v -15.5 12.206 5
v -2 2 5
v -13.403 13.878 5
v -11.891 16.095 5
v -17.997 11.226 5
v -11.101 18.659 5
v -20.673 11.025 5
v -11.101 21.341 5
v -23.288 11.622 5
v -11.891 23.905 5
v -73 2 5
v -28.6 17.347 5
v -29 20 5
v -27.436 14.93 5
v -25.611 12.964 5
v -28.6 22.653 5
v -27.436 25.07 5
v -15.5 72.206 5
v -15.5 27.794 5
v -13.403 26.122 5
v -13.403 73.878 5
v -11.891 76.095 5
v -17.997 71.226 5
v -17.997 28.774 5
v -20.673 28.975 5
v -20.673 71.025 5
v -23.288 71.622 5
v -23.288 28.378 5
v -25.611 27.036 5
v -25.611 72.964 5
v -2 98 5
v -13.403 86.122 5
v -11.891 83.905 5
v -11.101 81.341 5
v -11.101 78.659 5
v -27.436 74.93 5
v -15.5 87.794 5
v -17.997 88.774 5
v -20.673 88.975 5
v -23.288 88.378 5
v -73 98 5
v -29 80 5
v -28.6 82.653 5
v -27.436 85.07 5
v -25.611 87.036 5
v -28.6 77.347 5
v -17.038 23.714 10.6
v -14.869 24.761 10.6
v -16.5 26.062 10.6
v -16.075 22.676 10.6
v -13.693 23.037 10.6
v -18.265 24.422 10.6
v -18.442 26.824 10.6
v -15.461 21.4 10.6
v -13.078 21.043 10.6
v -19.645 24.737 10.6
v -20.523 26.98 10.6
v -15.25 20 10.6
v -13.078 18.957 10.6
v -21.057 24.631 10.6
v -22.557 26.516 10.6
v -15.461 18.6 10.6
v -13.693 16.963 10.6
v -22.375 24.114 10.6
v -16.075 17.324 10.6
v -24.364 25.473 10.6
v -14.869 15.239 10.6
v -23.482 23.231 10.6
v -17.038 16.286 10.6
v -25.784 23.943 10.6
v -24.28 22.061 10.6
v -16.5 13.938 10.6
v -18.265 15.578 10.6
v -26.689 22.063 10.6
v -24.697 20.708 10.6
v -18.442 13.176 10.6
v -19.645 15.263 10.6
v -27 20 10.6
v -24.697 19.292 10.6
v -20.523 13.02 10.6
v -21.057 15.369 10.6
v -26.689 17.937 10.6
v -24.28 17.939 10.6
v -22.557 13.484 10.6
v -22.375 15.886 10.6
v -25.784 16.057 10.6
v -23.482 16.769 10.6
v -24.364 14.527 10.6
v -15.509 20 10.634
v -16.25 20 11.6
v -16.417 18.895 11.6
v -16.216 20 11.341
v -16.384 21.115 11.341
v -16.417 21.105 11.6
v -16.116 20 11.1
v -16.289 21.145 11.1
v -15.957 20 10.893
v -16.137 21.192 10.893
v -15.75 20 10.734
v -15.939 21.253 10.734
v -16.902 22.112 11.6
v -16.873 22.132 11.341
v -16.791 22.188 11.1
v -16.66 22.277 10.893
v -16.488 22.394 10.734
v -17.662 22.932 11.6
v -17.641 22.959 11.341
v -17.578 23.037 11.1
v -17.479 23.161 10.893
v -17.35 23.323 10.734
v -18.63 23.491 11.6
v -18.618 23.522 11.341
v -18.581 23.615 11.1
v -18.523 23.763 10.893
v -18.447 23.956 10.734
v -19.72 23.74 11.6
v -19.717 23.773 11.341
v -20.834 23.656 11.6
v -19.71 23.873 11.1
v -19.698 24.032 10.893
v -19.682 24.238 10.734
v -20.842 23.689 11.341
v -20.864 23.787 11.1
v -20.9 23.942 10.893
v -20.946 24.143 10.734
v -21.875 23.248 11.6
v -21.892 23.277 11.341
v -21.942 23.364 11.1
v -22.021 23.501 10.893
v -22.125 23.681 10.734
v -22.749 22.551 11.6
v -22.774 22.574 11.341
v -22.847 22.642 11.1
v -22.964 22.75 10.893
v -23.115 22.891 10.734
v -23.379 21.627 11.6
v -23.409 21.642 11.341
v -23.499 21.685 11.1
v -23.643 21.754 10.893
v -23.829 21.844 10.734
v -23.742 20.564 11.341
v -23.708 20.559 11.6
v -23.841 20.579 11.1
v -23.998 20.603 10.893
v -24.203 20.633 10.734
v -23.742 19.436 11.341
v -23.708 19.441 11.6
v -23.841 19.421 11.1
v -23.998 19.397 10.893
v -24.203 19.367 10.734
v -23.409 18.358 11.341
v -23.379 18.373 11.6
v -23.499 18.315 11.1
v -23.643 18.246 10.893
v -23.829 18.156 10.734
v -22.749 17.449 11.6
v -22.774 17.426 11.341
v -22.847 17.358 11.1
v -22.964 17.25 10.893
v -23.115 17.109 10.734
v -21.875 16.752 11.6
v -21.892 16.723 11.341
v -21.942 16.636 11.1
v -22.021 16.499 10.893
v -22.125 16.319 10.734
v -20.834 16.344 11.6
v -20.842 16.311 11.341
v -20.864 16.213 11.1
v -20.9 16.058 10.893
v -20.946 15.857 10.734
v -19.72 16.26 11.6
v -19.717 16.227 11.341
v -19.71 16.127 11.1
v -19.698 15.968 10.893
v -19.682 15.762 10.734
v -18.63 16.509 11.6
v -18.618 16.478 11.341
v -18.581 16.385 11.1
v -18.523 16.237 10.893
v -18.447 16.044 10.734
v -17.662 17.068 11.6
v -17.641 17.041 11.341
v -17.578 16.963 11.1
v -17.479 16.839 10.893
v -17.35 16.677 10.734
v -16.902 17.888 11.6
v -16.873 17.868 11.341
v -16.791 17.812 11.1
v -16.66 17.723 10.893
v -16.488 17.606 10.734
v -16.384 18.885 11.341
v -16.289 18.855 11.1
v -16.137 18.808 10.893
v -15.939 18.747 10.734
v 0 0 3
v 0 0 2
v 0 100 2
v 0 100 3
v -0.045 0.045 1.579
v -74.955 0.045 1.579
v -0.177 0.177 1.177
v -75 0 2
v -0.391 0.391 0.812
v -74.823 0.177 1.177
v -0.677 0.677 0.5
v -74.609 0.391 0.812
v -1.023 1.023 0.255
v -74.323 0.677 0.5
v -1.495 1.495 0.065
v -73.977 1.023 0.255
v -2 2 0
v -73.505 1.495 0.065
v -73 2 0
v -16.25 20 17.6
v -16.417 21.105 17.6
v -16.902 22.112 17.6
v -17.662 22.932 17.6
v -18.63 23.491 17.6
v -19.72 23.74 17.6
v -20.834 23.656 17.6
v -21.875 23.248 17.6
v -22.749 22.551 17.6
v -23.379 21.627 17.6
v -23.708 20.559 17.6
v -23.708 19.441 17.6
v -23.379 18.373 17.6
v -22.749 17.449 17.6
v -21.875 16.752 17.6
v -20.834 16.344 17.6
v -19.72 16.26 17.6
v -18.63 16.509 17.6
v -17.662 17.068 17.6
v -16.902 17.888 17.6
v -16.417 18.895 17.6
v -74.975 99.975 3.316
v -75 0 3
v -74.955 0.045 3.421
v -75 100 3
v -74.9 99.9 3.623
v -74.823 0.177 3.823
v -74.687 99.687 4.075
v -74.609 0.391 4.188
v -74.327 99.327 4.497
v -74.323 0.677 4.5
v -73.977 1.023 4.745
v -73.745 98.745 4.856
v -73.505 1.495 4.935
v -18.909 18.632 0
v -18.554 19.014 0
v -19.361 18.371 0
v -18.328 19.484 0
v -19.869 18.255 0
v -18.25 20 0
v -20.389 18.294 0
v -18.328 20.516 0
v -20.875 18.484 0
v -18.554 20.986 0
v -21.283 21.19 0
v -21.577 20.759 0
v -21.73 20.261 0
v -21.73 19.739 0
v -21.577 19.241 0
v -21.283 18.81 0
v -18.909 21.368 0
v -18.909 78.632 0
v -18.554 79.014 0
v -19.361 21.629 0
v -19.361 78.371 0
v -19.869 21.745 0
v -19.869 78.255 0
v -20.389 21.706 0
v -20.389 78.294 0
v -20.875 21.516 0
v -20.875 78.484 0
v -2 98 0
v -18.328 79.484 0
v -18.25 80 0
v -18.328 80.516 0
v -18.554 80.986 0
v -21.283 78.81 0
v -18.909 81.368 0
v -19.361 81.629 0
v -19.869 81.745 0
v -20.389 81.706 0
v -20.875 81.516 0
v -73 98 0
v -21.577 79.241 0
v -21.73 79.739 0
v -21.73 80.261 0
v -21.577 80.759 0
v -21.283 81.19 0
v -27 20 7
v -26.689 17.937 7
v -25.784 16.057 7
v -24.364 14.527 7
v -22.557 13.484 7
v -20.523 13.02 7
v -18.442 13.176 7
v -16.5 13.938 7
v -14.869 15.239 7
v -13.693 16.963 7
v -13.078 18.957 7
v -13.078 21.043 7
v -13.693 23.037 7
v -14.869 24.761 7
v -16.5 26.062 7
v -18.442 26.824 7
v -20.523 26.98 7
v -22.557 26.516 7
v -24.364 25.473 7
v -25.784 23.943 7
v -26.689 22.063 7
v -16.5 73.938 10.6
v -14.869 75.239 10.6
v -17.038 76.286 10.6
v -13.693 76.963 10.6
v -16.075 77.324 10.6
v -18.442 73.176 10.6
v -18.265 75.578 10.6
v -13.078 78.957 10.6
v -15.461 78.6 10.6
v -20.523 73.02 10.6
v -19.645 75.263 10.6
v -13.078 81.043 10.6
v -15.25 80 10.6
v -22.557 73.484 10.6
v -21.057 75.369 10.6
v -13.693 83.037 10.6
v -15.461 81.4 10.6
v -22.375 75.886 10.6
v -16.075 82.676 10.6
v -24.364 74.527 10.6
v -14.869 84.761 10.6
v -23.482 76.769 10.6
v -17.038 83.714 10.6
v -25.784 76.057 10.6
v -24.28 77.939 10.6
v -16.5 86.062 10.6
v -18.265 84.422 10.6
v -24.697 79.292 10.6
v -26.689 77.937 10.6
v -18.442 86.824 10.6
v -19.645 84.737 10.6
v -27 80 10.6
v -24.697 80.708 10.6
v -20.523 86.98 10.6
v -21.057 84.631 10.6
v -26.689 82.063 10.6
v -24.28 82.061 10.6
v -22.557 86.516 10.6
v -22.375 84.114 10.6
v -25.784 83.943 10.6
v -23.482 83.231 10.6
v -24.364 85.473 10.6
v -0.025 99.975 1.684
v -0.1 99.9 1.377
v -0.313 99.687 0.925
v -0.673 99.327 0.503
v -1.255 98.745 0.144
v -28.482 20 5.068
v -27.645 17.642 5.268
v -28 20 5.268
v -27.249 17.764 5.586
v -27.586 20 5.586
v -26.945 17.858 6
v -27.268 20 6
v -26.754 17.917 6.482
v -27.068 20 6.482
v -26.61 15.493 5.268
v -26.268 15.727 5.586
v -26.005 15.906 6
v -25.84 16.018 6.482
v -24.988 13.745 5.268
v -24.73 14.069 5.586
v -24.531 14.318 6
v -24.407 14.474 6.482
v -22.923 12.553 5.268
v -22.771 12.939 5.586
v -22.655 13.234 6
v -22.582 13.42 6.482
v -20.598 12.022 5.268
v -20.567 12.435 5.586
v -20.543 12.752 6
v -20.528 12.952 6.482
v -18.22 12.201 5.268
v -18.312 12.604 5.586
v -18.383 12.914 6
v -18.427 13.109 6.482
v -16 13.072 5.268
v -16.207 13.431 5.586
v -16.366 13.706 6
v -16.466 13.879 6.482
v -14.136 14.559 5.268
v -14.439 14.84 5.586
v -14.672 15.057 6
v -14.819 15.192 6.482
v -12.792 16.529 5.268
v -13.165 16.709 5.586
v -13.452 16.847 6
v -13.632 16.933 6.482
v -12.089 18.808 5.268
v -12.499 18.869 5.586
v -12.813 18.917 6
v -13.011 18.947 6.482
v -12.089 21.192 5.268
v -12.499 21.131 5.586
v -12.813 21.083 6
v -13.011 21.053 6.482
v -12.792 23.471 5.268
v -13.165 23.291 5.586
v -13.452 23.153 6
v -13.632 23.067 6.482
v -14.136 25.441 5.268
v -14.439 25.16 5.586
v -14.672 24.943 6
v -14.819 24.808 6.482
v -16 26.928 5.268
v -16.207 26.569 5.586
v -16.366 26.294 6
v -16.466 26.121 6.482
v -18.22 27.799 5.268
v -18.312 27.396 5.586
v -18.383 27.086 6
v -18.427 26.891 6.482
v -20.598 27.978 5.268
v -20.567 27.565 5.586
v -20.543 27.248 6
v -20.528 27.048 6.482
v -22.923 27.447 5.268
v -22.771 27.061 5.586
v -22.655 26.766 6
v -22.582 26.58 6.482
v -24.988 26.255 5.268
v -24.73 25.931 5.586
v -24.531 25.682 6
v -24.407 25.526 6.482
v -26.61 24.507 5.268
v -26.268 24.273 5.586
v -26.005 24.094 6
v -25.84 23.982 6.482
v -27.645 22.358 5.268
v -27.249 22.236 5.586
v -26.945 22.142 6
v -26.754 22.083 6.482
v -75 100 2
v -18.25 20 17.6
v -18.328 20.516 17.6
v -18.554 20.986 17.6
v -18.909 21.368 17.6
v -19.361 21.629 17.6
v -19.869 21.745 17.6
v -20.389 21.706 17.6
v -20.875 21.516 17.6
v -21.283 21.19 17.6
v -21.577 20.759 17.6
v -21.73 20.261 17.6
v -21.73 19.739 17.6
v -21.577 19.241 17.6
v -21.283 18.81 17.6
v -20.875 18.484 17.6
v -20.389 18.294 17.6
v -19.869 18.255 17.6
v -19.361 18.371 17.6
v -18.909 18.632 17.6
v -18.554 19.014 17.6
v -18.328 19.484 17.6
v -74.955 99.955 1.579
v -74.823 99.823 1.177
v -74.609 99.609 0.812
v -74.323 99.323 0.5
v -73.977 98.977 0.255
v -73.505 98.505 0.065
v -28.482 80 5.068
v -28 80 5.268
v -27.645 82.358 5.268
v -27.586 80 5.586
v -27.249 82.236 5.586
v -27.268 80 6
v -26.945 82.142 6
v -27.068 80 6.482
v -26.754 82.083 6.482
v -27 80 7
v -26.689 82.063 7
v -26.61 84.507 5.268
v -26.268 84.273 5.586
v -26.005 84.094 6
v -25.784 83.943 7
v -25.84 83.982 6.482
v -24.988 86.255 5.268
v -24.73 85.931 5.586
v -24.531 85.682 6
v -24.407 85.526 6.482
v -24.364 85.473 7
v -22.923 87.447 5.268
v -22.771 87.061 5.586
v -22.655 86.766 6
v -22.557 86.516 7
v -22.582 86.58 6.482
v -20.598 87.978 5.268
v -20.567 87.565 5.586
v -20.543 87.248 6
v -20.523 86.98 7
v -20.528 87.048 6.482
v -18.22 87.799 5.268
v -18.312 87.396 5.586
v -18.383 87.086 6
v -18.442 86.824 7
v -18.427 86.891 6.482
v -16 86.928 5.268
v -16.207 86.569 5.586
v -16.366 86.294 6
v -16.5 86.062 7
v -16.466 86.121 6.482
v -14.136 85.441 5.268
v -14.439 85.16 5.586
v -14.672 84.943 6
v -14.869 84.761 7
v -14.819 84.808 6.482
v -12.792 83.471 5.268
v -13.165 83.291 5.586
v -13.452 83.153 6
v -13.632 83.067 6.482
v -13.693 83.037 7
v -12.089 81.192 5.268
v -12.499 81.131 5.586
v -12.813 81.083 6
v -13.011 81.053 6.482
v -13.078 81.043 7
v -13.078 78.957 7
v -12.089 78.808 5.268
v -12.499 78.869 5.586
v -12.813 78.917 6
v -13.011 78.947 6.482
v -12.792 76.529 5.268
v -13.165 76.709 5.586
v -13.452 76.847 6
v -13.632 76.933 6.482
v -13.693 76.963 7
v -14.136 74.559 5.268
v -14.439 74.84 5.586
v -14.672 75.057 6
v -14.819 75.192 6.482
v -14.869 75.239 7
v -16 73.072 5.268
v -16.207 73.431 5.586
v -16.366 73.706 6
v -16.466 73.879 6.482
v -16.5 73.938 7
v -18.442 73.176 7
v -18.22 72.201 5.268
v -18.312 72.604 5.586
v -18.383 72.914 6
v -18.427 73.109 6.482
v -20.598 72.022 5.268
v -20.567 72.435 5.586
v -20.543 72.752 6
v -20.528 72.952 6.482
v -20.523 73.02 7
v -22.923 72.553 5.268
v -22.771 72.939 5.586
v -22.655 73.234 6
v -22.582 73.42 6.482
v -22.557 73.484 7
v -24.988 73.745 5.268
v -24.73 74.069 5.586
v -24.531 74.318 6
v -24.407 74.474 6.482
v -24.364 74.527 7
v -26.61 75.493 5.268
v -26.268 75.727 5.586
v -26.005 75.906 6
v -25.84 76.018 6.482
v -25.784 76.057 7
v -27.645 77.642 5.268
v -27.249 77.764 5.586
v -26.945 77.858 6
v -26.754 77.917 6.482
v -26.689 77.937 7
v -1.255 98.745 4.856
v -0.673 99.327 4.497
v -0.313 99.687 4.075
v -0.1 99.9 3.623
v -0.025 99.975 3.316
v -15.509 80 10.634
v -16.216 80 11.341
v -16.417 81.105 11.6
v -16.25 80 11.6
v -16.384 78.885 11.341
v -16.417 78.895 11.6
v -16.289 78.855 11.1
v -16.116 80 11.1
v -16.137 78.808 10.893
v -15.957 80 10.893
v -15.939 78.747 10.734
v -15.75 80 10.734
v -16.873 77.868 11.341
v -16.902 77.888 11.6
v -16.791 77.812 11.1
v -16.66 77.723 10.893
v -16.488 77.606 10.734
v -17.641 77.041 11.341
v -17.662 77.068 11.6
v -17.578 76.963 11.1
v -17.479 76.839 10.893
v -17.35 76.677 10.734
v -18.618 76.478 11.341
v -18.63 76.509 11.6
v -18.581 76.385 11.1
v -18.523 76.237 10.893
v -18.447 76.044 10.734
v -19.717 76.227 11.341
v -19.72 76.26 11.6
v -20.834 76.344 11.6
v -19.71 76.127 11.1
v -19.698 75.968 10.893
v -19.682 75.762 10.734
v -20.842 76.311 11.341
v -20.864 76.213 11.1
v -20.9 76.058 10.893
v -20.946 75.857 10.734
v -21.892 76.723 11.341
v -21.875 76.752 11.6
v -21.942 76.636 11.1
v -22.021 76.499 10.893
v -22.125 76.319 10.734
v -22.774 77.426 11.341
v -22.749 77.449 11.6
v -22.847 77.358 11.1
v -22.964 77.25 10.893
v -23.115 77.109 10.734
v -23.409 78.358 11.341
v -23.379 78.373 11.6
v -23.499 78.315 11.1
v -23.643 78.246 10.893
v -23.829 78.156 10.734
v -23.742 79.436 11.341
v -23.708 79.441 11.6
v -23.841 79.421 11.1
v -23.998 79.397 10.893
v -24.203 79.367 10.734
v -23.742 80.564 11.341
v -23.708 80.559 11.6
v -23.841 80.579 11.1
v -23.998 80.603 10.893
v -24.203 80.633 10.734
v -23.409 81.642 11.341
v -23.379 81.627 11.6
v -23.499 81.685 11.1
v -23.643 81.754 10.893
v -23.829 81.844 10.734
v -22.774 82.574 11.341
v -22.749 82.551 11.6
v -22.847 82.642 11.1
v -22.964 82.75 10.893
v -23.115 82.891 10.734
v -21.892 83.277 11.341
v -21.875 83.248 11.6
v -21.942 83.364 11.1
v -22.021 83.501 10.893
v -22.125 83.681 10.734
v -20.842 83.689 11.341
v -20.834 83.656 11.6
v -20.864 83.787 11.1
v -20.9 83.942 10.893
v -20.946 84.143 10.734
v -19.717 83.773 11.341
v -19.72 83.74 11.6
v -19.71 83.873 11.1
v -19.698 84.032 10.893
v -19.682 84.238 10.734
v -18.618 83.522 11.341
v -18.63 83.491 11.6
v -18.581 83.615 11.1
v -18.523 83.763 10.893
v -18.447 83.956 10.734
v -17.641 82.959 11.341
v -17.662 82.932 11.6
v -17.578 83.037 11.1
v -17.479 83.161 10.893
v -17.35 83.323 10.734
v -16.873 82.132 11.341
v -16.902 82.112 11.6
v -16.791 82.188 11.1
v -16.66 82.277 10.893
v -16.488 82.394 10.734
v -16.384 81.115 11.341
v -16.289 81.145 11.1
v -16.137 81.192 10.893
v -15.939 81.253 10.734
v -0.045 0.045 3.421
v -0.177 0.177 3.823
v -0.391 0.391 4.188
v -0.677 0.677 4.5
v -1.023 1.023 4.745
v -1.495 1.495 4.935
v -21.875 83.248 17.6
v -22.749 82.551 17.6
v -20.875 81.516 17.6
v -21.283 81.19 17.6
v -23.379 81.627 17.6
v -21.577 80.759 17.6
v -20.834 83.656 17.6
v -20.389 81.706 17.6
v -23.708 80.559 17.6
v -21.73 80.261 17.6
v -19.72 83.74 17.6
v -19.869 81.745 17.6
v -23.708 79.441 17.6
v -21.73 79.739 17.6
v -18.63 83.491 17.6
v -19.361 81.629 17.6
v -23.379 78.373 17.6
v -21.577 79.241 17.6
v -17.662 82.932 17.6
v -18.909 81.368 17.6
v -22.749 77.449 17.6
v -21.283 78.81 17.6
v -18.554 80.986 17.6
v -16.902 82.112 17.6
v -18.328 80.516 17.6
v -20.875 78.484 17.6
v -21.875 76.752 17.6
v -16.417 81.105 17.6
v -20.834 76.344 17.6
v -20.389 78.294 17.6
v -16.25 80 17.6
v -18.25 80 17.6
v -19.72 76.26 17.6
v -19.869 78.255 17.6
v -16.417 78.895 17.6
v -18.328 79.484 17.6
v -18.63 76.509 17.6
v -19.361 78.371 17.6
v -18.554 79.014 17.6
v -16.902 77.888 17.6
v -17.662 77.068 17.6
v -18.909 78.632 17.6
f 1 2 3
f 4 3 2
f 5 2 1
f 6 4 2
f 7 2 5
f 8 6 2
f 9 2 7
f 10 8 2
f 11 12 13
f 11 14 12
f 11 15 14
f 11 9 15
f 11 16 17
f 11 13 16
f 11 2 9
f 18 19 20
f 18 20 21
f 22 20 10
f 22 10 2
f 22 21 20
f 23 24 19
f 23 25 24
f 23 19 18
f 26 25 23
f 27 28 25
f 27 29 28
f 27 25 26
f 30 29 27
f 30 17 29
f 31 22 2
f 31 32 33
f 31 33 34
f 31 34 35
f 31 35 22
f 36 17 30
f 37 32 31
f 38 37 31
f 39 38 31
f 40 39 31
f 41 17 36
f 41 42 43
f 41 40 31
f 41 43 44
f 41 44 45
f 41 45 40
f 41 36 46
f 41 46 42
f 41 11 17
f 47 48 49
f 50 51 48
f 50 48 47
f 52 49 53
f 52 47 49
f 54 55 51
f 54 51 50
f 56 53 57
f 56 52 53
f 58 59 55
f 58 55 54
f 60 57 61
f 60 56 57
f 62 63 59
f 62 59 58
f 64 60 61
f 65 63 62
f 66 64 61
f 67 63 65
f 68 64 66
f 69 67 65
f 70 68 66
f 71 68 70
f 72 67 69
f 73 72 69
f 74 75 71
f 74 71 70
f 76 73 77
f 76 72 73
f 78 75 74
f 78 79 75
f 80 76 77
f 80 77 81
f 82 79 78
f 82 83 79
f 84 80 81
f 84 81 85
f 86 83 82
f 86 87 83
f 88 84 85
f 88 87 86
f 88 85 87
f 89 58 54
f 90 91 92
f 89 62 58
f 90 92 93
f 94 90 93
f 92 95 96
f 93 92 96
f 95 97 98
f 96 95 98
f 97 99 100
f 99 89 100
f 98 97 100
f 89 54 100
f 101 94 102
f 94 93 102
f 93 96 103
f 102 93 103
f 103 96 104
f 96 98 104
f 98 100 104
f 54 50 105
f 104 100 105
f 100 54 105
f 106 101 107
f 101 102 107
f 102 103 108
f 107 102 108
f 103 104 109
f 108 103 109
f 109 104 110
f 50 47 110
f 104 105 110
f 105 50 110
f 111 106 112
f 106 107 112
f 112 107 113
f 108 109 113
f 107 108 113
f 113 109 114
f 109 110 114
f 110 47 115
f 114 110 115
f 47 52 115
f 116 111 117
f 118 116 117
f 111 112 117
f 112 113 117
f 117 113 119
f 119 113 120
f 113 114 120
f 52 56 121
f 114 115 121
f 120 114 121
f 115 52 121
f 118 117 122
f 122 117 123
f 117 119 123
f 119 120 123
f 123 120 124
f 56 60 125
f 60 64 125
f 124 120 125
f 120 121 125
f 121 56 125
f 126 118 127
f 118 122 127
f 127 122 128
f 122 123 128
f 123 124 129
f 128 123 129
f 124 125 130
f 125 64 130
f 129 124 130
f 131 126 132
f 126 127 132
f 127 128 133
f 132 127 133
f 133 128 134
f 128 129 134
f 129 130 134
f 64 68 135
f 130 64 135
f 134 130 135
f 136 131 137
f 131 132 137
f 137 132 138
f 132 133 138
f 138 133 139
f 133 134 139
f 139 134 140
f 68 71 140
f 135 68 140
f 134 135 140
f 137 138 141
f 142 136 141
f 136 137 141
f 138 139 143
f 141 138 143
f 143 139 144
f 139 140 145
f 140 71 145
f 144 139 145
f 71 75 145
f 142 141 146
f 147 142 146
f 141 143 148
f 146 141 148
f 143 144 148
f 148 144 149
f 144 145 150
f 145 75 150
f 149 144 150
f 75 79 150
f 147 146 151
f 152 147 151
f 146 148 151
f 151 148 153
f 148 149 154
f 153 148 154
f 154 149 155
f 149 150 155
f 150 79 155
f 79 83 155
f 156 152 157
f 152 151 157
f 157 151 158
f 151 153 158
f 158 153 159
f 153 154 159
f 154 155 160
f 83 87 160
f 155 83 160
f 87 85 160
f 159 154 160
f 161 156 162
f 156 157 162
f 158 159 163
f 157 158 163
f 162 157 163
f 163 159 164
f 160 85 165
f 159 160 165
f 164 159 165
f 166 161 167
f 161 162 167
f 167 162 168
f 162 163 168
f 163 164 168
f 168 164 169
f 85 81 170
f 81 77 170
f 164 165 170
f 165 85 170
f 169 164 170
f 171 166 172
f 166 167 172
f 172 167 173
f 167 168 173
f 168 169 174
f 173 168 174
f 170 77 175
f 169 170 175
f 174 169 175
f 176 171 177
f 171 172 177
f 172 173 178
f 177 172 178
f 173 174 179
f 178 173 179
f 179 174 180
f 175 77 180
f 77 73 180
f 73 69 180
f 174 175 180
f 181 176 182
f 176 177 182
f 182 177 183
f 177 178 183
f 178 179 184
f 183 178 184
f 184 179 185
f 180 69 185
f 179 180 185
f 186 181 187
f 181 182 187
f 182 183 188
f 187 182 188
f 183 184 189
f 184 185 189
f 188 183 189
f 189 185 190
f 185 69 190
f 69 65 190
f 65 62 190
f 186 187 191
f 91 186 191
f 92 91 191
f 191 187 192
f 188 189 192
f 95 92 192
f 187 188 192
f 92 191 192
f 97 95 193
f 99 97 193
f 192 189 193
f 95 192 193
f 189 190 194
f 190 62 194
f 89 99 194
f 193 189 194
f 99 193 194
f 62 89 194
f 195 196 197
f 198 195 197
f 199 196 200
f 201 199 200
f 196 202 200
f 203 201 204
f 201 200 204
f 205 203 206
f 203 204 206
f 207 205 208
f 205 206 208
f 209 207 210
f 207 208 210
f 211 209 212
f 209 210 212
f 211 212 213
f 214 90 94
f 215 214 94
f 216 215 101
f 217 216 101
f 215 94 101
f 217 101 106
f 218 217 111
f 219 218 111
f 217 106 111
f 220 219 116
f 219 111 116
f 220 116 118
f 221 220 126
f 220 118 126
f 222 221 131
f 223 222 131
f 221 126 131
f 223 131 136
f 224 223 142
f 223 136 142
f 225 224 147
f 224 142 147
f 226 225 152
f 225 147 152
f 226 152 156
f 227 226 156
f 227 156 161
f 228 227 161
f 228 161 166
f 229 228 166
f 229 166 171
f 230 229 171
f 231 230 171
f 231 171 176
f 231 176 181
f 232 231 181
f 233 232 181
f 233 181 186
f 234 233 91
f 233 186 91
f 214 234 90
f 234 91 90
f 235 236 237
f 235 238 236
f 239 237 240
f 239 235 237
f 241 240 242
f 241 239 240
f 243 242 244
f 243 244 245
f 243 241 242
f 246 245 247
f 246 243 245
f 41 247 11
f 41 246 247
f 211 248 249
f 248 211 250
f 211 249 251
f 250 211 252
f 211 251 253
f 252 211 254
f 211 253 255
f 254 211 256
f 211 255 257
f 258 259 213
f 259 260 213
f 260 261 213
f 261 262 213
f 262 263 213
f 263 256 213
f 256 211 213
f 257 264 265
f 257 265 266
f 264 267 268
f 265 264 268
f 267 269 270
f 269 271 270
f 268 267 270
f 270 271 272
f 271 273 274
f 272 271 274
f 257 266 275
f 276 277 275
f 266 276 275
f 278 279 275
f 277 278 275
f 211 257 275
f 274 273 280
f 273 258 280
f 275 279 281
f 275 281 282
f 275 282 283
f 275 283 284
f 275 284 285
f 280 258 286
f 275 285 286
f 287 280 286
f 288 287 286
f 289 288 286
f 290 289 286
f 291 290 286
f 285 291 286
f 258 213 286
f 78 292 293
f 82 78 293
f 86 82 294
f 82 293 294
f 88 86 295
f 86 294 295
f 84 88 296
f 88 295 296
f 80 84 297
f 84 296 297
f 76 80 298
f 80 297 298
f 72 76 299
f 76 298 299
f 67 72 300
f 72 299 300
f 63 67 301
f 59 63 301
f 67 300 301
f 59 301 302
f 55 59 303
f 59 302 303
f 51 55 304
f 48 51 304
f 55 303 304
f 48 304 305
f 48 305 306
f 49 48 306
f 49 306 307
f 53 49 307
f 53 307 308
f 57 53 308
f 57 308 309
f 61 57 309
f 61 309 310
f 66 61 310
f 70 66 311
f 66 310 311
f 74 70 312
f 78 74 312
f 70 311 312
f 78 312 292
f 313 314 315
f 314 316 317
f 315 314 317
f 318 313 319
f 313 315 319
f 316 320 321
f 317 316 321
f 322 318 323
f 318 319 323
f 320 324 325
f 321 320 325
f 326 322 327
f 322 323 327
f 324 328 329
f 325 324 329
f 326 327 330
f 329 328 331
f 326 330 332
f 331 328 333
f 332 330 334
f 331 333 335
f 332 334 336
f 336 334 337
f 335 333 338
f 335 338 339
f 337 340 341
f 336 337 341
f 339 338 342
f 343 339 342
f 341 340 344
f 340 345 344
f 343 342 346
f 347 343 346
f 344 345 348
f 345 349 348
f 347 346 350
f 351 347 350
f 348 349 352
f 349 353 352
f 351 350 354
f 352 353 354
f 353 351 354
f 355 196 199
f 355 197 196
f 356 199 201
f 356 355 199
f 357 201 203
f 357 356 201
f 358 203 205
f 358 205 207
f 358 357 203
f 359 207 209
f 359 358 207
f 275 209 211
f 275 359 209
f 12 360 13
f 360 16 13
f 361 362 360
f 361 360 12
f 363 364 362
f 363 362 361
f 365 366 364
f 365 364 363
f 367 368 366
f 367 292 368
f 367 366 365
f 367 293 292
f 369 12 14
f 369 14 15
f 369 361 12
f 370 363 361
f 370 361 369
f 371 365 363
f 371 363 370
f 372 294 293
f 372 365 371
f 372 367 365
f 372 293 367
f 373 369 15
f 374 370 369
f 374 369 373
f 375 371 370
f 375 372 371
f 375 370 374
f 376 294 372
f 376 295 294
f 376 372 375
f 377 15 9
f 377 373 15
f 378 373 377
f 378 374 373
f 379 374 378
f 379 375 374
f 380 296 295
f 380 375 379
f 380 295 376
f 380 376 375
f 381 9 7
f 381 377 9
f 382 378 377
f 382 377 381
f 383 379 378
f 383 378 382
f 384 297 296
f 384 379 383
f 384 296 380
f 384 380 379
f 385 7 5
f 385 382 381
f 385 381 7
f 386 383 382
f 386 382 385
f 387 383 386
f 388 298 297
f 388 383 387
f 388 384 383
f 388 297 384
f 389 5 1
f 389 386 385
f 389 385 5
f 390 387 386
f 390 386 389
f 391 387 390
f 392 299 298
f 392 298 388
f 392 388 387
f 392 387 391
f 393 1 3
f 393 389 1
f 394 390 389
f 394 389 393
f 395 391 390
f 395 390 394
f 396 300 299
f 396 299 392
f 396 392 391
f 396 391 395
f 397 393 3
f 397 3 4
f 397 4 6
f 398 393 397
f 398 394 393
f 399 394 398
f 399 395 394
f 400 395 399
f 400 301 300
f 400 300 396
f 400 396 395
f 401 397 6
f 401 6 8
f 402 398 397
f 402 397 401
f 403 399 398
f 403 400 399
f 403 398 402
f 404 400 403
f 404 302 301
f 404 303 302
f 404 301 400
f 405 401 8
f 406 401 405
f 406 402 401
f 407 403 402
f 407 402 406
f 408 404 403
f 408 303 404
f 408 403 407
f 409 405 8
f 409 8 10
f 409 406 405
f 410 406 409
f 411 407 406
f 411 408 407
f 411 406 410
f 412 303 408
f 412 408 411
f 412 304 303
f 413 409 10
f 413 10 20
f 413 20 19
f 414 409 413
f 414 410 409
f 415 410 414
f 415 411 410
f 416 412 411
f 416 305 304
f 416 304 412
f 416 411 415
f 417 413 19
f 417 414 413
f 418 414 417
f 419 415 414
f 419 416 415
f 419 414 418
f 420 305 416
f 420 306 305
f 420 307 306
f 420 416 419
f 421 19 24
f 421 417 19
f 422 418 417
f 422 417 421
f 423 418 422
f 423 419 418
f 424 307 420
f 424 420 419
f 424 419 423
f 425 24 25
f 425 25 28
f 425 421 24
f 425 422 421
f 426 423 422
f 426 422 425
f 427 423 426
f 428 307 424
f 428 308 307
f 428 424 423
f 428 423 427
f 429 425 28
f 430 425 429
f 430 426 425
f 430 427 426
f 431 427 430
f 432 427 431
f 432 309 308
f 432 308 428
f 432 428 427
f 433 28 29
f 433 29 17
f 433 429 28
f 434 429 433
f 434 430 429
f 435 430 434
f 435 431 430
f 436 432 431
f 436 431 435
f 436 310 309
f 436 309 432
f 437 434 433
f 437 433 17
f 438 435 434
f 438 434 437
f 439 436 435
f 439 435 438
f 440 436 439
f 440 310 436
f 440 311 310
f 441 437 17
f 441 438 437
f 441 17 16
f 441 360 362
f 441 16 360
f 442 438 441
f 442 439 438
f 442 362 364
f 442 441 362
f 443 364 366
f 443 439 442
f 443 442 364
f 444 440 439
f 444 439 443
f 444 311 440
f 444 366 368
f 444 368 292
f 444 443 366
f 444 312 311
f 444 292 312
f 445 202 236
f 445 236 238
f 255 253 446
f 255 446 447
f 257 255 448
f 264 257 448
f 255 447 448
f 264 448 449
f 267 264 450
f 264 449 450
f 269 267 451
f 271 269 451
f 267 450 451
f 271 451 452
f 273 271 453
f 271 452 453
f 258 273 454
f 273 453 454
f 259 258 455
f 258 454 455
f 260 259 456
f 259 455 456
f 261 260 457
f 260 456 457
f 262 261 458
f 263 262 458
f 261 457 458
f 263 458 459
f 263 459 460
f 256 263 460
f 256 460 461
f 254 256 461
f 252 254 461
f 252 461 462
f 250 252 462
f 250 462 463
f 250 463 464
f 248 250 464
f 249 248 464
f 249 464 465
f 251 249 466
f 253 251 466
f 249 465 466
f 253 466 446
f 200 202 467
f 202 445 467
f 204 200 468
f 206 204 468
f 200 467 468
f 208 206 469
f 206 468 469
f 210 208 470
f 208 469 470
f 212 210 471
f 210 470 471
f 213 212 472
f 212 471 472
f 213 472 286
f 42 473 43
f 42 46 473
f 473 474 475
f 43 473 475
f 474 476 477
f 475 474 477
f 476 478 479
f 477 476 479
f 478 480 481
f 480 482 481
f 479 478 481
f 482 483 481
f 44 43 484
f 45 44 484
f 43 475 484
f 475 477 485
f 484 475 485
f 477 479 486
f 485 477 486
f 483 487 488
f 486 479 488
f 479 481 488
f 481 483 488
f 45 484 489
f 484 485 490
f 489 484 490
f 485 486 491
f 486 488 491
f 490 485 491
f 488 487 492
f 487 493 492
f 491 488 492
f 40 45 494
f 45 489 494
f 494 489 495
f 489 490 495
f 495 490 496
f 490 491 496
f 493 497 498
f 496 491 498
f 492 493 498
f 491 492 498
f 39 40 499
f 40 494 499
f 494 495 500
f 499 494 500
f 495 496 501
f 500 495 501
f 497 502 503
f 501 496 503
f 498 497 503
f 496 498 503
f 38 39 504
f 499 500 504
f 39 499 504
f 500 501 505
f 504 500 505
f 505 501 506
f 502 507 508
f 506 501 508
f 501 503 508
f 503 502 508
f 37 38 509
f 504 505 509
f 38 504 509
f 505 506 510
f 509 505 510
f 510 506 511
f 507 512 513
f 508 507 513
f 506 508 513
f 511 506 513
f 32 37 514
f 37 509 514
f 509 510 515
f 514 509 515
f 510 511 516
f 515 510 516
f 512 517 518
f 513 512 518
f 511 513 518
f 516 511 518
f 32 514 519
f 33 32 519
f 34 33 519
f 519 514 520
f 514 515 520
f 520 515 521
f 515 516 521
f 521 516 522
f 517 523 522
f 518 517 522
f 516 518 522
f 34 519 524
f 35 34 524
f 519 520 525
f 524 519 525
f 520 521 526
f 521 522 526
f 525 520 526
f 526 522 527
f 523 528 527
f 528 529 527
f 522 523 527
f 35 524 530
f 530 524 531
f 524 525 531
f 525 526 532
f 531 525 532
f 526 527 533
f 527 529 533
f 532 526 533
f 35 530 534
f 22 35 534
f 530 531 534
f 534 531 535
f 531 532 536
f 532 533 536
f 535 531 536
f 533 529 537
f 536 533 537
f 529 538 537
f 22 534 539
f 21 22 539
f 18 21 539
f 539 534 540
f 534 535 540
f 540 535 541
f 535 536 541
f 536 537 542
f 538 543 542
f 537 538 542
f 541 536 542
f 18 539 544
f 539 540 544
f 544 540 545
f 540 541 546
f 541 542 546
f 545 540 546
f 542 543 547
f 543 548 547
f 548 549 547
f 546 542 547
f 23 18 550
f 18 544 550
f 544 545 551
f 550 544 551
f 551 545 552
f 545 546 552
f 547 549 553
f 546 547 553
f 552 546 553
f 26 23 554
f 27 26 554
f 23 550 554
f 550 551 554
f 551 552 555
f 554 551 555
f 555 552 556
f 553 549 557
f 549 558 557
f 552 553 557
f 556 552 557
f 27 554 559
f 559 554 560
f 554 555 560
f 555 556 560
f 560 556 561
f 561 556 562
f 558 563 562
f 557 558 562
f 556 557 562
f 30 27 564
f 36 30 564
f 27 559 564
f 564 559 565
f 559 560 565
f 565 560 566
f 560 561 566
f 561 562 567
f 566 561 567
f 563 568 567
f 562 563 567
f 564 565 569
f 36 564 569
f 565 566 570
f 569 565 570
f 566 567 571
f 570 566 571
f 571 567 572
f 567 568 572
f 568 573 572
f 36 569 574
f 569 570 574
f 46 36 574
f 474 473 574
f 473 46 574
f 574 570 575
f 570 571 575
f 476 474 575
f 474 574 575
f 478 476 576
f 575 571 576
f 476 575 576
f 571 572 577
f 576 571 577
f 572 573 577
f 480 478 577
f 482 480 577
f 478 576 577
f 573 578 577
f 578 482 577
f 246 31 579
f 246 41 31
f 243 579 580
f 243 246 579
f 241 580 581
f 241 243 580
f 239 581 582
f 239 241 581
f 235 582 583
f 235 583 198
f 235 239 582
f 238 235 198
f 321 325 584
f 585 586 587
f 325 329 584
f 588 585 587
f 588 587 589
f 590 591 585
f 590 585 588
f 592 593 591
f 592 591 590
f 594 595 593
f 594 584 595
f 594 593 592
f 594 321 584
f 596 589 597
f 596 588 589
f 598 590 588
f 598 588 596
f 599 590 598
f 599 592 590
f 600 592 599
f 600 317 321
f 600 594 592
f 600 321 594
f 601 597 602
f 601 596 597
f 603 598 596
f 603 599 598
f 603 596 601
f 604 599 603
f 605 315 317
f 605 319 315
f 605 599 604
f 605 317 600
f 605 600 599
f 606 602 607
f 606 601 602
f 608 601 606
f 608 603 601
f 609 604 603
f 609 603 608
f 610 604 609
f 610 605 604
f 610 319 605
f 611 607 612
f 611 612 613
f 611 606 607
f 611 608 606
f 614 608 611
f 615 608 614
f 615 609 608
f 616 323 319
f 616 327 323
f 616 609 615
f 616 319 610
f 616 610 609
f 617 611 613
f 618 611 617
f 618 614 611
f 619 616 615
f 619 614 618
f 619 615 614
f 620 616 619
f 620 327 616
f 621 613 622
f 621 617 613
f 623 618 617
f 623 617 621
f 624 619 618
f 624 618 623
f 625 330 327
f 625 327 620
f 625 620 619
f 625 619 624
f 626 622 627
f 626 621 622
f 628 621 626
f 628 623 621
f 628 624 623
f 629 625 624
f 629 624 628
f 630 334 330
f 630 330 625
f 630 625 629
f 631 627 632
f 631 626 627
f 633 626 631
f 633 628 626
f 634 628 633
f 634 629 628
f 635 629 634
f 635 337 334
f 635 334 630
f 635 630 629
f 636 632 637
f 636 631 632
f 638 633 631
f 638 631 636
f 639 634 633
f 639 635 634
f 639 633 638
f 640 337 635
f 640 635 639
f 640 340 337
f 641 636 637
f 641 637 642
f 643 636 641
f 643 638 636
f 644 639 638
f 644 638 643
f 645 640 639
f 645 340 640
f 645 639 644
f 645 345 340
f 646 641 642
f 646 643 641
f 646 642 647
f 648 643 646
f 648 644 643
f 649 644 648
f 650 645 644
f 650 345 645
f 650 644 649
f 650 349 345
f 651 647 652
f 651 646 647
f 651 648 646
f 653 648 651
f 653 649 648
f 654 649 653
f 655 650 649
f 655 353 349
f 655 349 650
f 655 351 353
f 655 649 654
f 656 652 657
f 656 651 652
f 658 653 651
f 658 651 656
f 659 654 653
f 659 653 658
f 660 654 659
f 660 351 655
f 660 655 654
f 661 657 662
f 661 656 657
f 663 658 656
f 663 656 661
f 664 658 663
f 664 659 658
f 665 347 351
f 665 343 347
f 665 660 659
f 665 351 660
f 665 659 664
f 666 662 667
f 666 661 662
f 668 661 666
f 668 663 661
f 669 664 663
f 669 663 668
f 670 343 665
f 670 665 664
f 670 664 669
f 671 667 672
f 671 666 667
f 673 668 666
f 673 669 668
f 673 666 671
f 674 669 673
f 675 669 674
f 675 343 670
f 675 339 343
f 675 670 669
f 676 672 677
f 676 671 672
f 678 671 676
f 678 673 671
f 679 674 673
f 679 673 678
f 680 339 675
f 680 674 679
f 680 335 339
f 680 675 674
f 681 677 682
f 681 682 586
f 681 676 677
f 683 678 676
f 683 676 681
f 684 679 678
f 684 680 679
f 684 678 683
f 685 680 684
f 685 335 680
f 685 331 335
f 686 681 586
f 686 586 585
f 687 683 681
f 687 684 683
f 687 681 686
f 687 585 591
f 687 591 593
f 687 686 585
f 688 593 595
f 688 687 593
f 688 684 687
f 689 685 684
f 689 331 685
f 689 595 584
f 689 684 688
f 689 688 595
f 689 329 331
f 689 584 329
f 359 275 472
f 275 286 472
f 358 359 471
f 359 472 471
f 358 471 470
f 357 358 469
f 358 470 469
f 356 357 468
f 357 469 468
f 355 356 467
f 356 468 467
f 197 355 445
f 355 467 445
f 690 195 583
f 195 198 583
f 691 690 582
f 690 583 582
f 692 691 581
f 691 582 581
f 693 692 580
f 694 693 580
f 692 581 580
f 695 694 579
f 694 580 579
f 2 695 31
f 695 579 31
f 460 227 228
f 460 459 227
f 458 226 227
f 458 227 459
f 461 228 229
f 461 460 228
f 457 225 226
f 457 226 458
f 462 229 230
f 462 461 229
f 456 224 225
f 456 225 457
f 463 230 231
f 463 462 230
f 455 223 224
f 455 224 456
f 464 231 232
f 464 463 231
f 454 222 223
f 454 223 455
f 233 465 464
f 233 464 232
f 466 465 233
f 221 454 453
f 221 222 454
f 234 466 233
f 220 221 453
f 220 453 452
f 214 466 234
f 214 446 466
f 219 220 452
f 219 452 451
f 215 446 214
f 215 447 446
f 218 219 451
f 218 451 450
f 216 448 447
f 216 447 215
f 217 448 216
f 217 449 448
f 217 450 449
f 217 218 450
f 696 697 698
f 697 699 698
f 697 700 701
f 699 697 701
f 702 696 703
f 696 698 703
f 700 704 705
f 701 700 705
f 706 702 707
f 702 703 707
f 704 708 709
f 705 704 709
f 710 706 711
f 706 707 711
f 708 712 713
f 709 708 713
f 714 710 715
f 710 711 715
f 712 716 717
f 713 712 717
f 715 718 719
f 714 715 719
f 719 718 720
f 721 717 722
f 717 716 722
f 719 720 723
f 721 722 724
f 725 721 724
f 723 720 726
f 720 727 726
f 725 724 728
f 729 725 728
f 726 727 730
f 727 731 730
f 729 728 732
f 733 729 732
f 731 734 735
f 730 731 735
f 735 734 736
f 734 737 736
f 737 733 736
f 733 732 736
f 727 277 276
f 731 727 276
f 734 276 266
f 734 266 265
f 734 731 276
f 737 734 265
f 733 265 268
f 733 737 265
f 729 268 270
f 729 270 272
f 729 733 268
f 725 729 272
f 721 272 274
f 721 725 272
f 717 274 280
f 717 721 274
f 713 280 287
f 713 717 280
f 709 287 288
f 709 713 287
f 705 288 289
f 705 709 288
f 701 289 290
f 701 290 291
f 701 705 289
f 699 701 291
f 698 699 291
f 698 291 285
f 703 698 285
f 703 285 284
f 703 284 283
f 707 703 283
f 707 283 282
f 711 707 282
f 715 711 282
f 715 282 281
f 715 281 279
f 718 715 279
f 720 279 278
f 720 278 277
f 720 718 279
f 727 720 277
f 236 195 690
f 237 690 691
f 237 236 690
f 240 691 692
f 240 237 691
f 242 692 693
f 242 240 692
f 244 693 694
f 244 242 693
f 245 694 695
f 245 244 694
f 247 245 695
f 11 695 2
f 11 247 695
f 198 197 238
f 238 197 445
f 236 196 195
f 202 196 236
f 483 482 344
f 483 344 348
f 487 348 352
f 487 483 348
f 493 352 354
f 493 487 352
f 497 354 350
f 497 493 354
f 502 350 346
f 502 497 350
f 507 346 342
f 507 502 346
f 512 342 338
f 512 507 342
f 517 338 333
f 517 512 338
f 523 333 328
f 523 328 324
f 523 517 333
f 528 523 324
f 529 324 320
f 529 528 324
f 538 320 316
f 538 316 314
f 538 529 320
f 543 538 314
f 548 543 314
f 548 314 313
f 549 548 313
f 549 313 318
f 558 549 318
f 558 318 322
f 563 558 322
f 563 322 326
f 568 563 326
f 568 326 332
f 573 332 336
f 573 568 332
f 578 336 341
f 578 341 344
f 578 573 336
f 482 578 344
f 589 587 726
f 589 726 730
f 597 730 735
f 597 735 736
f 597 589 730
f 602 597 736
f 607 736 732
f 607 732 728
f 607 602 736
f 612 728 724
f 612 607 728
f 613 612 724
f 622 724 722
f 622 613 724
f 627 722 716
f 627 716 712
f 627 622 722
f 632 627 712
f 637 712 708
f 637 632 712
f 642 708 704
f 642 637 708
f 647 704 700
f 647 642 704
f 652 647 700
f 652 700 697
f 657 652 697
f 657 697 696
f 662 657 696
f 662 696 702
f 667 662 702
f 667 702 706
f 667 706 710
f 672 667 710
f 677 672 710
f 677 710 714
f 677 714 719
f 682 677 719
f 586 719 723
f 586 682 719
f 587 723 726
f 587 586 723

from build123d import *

# Parameters (mm, degrees)
SKETCH1_W               = 100
SKETCH1_H               = 75
PLATE_DEPTH             = 5
SKETCH2_R               = 7
BEARING_SUPPORT_DEPTH   = 5.6
SKETCH3_R               = 3.75
BEARING_PIN_DEPTH       = 7
SKETCH4_R               = 1.75
SCREW_THROUGHHOLE_DEPTH = 17.6
FILLET1_R               = 2
FILLET2_R               = 1


with BuildPart() as part:
    # Sketch1 → Plate (new body)
    with BuildSketch(Plane(origin=(0, 0, 0), x_dir=(0, 1, 0), z_dir=(0, 0, 1))):
        with Locations((50, 37.5)):
            Rectangle(SKETCH1_W, SKETCH1_H)
    extrude(amount=PLATE_DEPTH)

    # Sketch2 → Bearing Support (add)
    with BuildSketch(Plane.XY.offset(5)):
        with Locations(Location((-20, 20, 0), (0, 0, 180))):
            Circle(SKETCH2_R)
    bearing_support = extrude(amount=BEARING_SUPPORT_DEPTH)

    # Sketch3 → Bearing Pin (add)
    with BuildSketch(Plane.XY.offset(10.6)):
        with Locations((-20, 20)):
            Circle(SKETCH3_R)
    bearing_pin = extrude(amount=BEARING_PIN_DEPTH)

    # Sketch4 → Screw ThroughHole (cut)
    with BuildSketch(Plane.XY.offset(17.6)):
        with Locations((-20, 20)):
            Circle(SKETCH4_R)
    screw_throughhole = extrude(amount=-SCREW_THROUGHHOLE_DEPTH, mode=Mode.SUBTRACT)

    # Mirror1: Bearing Support, Bearing Pin, Screw ThroughHole across plane
    add(bearing_support.mirror(Plane(origin=(0, 50, 0), x_dir=(0, 0, 1), z_dir=(0, -1, 0))))
    add(bearing_pin.mirror(Plane(origin=(0, 50, 0), x_dir=(0, 0, 1), z_dir=(0, -1, 0))))
    add(screw_throughhole.mirror(Plane(origin=(0, 50, 0), x_dir=(0, 0, 1), z_dir=(0, -1, 0))), mode=Mode.SUBTRACT)

    # Fillet1
    fillet1_edges = [part.edges().sort_by_distance(p)[0] for p in [
        (-37.5, 100, 5),
        (-13, 20, 5),
        (-75, 50, 5),
        (-13, 80, 5),
        (-37.5, 0, 5),
        (-75, 50, 0),
        (-37.5, 100, 0),
        (0, 50, 0),
        (-37.5, 0, 0),
        (0, 50, 5),
    ]]
    fillet(fillet1_edges, radius=FILLET1_R)

    # Fillet2
    fillet2_edges = [part.edges().sort_by_distance(p)[0] for p in [
        (-23.75, 20, 10.6),
        (-23.75, 80, 10.6),
    ]]
    fillet(fillet2_edges, radius=FILLET2_R)


solid = part.part
